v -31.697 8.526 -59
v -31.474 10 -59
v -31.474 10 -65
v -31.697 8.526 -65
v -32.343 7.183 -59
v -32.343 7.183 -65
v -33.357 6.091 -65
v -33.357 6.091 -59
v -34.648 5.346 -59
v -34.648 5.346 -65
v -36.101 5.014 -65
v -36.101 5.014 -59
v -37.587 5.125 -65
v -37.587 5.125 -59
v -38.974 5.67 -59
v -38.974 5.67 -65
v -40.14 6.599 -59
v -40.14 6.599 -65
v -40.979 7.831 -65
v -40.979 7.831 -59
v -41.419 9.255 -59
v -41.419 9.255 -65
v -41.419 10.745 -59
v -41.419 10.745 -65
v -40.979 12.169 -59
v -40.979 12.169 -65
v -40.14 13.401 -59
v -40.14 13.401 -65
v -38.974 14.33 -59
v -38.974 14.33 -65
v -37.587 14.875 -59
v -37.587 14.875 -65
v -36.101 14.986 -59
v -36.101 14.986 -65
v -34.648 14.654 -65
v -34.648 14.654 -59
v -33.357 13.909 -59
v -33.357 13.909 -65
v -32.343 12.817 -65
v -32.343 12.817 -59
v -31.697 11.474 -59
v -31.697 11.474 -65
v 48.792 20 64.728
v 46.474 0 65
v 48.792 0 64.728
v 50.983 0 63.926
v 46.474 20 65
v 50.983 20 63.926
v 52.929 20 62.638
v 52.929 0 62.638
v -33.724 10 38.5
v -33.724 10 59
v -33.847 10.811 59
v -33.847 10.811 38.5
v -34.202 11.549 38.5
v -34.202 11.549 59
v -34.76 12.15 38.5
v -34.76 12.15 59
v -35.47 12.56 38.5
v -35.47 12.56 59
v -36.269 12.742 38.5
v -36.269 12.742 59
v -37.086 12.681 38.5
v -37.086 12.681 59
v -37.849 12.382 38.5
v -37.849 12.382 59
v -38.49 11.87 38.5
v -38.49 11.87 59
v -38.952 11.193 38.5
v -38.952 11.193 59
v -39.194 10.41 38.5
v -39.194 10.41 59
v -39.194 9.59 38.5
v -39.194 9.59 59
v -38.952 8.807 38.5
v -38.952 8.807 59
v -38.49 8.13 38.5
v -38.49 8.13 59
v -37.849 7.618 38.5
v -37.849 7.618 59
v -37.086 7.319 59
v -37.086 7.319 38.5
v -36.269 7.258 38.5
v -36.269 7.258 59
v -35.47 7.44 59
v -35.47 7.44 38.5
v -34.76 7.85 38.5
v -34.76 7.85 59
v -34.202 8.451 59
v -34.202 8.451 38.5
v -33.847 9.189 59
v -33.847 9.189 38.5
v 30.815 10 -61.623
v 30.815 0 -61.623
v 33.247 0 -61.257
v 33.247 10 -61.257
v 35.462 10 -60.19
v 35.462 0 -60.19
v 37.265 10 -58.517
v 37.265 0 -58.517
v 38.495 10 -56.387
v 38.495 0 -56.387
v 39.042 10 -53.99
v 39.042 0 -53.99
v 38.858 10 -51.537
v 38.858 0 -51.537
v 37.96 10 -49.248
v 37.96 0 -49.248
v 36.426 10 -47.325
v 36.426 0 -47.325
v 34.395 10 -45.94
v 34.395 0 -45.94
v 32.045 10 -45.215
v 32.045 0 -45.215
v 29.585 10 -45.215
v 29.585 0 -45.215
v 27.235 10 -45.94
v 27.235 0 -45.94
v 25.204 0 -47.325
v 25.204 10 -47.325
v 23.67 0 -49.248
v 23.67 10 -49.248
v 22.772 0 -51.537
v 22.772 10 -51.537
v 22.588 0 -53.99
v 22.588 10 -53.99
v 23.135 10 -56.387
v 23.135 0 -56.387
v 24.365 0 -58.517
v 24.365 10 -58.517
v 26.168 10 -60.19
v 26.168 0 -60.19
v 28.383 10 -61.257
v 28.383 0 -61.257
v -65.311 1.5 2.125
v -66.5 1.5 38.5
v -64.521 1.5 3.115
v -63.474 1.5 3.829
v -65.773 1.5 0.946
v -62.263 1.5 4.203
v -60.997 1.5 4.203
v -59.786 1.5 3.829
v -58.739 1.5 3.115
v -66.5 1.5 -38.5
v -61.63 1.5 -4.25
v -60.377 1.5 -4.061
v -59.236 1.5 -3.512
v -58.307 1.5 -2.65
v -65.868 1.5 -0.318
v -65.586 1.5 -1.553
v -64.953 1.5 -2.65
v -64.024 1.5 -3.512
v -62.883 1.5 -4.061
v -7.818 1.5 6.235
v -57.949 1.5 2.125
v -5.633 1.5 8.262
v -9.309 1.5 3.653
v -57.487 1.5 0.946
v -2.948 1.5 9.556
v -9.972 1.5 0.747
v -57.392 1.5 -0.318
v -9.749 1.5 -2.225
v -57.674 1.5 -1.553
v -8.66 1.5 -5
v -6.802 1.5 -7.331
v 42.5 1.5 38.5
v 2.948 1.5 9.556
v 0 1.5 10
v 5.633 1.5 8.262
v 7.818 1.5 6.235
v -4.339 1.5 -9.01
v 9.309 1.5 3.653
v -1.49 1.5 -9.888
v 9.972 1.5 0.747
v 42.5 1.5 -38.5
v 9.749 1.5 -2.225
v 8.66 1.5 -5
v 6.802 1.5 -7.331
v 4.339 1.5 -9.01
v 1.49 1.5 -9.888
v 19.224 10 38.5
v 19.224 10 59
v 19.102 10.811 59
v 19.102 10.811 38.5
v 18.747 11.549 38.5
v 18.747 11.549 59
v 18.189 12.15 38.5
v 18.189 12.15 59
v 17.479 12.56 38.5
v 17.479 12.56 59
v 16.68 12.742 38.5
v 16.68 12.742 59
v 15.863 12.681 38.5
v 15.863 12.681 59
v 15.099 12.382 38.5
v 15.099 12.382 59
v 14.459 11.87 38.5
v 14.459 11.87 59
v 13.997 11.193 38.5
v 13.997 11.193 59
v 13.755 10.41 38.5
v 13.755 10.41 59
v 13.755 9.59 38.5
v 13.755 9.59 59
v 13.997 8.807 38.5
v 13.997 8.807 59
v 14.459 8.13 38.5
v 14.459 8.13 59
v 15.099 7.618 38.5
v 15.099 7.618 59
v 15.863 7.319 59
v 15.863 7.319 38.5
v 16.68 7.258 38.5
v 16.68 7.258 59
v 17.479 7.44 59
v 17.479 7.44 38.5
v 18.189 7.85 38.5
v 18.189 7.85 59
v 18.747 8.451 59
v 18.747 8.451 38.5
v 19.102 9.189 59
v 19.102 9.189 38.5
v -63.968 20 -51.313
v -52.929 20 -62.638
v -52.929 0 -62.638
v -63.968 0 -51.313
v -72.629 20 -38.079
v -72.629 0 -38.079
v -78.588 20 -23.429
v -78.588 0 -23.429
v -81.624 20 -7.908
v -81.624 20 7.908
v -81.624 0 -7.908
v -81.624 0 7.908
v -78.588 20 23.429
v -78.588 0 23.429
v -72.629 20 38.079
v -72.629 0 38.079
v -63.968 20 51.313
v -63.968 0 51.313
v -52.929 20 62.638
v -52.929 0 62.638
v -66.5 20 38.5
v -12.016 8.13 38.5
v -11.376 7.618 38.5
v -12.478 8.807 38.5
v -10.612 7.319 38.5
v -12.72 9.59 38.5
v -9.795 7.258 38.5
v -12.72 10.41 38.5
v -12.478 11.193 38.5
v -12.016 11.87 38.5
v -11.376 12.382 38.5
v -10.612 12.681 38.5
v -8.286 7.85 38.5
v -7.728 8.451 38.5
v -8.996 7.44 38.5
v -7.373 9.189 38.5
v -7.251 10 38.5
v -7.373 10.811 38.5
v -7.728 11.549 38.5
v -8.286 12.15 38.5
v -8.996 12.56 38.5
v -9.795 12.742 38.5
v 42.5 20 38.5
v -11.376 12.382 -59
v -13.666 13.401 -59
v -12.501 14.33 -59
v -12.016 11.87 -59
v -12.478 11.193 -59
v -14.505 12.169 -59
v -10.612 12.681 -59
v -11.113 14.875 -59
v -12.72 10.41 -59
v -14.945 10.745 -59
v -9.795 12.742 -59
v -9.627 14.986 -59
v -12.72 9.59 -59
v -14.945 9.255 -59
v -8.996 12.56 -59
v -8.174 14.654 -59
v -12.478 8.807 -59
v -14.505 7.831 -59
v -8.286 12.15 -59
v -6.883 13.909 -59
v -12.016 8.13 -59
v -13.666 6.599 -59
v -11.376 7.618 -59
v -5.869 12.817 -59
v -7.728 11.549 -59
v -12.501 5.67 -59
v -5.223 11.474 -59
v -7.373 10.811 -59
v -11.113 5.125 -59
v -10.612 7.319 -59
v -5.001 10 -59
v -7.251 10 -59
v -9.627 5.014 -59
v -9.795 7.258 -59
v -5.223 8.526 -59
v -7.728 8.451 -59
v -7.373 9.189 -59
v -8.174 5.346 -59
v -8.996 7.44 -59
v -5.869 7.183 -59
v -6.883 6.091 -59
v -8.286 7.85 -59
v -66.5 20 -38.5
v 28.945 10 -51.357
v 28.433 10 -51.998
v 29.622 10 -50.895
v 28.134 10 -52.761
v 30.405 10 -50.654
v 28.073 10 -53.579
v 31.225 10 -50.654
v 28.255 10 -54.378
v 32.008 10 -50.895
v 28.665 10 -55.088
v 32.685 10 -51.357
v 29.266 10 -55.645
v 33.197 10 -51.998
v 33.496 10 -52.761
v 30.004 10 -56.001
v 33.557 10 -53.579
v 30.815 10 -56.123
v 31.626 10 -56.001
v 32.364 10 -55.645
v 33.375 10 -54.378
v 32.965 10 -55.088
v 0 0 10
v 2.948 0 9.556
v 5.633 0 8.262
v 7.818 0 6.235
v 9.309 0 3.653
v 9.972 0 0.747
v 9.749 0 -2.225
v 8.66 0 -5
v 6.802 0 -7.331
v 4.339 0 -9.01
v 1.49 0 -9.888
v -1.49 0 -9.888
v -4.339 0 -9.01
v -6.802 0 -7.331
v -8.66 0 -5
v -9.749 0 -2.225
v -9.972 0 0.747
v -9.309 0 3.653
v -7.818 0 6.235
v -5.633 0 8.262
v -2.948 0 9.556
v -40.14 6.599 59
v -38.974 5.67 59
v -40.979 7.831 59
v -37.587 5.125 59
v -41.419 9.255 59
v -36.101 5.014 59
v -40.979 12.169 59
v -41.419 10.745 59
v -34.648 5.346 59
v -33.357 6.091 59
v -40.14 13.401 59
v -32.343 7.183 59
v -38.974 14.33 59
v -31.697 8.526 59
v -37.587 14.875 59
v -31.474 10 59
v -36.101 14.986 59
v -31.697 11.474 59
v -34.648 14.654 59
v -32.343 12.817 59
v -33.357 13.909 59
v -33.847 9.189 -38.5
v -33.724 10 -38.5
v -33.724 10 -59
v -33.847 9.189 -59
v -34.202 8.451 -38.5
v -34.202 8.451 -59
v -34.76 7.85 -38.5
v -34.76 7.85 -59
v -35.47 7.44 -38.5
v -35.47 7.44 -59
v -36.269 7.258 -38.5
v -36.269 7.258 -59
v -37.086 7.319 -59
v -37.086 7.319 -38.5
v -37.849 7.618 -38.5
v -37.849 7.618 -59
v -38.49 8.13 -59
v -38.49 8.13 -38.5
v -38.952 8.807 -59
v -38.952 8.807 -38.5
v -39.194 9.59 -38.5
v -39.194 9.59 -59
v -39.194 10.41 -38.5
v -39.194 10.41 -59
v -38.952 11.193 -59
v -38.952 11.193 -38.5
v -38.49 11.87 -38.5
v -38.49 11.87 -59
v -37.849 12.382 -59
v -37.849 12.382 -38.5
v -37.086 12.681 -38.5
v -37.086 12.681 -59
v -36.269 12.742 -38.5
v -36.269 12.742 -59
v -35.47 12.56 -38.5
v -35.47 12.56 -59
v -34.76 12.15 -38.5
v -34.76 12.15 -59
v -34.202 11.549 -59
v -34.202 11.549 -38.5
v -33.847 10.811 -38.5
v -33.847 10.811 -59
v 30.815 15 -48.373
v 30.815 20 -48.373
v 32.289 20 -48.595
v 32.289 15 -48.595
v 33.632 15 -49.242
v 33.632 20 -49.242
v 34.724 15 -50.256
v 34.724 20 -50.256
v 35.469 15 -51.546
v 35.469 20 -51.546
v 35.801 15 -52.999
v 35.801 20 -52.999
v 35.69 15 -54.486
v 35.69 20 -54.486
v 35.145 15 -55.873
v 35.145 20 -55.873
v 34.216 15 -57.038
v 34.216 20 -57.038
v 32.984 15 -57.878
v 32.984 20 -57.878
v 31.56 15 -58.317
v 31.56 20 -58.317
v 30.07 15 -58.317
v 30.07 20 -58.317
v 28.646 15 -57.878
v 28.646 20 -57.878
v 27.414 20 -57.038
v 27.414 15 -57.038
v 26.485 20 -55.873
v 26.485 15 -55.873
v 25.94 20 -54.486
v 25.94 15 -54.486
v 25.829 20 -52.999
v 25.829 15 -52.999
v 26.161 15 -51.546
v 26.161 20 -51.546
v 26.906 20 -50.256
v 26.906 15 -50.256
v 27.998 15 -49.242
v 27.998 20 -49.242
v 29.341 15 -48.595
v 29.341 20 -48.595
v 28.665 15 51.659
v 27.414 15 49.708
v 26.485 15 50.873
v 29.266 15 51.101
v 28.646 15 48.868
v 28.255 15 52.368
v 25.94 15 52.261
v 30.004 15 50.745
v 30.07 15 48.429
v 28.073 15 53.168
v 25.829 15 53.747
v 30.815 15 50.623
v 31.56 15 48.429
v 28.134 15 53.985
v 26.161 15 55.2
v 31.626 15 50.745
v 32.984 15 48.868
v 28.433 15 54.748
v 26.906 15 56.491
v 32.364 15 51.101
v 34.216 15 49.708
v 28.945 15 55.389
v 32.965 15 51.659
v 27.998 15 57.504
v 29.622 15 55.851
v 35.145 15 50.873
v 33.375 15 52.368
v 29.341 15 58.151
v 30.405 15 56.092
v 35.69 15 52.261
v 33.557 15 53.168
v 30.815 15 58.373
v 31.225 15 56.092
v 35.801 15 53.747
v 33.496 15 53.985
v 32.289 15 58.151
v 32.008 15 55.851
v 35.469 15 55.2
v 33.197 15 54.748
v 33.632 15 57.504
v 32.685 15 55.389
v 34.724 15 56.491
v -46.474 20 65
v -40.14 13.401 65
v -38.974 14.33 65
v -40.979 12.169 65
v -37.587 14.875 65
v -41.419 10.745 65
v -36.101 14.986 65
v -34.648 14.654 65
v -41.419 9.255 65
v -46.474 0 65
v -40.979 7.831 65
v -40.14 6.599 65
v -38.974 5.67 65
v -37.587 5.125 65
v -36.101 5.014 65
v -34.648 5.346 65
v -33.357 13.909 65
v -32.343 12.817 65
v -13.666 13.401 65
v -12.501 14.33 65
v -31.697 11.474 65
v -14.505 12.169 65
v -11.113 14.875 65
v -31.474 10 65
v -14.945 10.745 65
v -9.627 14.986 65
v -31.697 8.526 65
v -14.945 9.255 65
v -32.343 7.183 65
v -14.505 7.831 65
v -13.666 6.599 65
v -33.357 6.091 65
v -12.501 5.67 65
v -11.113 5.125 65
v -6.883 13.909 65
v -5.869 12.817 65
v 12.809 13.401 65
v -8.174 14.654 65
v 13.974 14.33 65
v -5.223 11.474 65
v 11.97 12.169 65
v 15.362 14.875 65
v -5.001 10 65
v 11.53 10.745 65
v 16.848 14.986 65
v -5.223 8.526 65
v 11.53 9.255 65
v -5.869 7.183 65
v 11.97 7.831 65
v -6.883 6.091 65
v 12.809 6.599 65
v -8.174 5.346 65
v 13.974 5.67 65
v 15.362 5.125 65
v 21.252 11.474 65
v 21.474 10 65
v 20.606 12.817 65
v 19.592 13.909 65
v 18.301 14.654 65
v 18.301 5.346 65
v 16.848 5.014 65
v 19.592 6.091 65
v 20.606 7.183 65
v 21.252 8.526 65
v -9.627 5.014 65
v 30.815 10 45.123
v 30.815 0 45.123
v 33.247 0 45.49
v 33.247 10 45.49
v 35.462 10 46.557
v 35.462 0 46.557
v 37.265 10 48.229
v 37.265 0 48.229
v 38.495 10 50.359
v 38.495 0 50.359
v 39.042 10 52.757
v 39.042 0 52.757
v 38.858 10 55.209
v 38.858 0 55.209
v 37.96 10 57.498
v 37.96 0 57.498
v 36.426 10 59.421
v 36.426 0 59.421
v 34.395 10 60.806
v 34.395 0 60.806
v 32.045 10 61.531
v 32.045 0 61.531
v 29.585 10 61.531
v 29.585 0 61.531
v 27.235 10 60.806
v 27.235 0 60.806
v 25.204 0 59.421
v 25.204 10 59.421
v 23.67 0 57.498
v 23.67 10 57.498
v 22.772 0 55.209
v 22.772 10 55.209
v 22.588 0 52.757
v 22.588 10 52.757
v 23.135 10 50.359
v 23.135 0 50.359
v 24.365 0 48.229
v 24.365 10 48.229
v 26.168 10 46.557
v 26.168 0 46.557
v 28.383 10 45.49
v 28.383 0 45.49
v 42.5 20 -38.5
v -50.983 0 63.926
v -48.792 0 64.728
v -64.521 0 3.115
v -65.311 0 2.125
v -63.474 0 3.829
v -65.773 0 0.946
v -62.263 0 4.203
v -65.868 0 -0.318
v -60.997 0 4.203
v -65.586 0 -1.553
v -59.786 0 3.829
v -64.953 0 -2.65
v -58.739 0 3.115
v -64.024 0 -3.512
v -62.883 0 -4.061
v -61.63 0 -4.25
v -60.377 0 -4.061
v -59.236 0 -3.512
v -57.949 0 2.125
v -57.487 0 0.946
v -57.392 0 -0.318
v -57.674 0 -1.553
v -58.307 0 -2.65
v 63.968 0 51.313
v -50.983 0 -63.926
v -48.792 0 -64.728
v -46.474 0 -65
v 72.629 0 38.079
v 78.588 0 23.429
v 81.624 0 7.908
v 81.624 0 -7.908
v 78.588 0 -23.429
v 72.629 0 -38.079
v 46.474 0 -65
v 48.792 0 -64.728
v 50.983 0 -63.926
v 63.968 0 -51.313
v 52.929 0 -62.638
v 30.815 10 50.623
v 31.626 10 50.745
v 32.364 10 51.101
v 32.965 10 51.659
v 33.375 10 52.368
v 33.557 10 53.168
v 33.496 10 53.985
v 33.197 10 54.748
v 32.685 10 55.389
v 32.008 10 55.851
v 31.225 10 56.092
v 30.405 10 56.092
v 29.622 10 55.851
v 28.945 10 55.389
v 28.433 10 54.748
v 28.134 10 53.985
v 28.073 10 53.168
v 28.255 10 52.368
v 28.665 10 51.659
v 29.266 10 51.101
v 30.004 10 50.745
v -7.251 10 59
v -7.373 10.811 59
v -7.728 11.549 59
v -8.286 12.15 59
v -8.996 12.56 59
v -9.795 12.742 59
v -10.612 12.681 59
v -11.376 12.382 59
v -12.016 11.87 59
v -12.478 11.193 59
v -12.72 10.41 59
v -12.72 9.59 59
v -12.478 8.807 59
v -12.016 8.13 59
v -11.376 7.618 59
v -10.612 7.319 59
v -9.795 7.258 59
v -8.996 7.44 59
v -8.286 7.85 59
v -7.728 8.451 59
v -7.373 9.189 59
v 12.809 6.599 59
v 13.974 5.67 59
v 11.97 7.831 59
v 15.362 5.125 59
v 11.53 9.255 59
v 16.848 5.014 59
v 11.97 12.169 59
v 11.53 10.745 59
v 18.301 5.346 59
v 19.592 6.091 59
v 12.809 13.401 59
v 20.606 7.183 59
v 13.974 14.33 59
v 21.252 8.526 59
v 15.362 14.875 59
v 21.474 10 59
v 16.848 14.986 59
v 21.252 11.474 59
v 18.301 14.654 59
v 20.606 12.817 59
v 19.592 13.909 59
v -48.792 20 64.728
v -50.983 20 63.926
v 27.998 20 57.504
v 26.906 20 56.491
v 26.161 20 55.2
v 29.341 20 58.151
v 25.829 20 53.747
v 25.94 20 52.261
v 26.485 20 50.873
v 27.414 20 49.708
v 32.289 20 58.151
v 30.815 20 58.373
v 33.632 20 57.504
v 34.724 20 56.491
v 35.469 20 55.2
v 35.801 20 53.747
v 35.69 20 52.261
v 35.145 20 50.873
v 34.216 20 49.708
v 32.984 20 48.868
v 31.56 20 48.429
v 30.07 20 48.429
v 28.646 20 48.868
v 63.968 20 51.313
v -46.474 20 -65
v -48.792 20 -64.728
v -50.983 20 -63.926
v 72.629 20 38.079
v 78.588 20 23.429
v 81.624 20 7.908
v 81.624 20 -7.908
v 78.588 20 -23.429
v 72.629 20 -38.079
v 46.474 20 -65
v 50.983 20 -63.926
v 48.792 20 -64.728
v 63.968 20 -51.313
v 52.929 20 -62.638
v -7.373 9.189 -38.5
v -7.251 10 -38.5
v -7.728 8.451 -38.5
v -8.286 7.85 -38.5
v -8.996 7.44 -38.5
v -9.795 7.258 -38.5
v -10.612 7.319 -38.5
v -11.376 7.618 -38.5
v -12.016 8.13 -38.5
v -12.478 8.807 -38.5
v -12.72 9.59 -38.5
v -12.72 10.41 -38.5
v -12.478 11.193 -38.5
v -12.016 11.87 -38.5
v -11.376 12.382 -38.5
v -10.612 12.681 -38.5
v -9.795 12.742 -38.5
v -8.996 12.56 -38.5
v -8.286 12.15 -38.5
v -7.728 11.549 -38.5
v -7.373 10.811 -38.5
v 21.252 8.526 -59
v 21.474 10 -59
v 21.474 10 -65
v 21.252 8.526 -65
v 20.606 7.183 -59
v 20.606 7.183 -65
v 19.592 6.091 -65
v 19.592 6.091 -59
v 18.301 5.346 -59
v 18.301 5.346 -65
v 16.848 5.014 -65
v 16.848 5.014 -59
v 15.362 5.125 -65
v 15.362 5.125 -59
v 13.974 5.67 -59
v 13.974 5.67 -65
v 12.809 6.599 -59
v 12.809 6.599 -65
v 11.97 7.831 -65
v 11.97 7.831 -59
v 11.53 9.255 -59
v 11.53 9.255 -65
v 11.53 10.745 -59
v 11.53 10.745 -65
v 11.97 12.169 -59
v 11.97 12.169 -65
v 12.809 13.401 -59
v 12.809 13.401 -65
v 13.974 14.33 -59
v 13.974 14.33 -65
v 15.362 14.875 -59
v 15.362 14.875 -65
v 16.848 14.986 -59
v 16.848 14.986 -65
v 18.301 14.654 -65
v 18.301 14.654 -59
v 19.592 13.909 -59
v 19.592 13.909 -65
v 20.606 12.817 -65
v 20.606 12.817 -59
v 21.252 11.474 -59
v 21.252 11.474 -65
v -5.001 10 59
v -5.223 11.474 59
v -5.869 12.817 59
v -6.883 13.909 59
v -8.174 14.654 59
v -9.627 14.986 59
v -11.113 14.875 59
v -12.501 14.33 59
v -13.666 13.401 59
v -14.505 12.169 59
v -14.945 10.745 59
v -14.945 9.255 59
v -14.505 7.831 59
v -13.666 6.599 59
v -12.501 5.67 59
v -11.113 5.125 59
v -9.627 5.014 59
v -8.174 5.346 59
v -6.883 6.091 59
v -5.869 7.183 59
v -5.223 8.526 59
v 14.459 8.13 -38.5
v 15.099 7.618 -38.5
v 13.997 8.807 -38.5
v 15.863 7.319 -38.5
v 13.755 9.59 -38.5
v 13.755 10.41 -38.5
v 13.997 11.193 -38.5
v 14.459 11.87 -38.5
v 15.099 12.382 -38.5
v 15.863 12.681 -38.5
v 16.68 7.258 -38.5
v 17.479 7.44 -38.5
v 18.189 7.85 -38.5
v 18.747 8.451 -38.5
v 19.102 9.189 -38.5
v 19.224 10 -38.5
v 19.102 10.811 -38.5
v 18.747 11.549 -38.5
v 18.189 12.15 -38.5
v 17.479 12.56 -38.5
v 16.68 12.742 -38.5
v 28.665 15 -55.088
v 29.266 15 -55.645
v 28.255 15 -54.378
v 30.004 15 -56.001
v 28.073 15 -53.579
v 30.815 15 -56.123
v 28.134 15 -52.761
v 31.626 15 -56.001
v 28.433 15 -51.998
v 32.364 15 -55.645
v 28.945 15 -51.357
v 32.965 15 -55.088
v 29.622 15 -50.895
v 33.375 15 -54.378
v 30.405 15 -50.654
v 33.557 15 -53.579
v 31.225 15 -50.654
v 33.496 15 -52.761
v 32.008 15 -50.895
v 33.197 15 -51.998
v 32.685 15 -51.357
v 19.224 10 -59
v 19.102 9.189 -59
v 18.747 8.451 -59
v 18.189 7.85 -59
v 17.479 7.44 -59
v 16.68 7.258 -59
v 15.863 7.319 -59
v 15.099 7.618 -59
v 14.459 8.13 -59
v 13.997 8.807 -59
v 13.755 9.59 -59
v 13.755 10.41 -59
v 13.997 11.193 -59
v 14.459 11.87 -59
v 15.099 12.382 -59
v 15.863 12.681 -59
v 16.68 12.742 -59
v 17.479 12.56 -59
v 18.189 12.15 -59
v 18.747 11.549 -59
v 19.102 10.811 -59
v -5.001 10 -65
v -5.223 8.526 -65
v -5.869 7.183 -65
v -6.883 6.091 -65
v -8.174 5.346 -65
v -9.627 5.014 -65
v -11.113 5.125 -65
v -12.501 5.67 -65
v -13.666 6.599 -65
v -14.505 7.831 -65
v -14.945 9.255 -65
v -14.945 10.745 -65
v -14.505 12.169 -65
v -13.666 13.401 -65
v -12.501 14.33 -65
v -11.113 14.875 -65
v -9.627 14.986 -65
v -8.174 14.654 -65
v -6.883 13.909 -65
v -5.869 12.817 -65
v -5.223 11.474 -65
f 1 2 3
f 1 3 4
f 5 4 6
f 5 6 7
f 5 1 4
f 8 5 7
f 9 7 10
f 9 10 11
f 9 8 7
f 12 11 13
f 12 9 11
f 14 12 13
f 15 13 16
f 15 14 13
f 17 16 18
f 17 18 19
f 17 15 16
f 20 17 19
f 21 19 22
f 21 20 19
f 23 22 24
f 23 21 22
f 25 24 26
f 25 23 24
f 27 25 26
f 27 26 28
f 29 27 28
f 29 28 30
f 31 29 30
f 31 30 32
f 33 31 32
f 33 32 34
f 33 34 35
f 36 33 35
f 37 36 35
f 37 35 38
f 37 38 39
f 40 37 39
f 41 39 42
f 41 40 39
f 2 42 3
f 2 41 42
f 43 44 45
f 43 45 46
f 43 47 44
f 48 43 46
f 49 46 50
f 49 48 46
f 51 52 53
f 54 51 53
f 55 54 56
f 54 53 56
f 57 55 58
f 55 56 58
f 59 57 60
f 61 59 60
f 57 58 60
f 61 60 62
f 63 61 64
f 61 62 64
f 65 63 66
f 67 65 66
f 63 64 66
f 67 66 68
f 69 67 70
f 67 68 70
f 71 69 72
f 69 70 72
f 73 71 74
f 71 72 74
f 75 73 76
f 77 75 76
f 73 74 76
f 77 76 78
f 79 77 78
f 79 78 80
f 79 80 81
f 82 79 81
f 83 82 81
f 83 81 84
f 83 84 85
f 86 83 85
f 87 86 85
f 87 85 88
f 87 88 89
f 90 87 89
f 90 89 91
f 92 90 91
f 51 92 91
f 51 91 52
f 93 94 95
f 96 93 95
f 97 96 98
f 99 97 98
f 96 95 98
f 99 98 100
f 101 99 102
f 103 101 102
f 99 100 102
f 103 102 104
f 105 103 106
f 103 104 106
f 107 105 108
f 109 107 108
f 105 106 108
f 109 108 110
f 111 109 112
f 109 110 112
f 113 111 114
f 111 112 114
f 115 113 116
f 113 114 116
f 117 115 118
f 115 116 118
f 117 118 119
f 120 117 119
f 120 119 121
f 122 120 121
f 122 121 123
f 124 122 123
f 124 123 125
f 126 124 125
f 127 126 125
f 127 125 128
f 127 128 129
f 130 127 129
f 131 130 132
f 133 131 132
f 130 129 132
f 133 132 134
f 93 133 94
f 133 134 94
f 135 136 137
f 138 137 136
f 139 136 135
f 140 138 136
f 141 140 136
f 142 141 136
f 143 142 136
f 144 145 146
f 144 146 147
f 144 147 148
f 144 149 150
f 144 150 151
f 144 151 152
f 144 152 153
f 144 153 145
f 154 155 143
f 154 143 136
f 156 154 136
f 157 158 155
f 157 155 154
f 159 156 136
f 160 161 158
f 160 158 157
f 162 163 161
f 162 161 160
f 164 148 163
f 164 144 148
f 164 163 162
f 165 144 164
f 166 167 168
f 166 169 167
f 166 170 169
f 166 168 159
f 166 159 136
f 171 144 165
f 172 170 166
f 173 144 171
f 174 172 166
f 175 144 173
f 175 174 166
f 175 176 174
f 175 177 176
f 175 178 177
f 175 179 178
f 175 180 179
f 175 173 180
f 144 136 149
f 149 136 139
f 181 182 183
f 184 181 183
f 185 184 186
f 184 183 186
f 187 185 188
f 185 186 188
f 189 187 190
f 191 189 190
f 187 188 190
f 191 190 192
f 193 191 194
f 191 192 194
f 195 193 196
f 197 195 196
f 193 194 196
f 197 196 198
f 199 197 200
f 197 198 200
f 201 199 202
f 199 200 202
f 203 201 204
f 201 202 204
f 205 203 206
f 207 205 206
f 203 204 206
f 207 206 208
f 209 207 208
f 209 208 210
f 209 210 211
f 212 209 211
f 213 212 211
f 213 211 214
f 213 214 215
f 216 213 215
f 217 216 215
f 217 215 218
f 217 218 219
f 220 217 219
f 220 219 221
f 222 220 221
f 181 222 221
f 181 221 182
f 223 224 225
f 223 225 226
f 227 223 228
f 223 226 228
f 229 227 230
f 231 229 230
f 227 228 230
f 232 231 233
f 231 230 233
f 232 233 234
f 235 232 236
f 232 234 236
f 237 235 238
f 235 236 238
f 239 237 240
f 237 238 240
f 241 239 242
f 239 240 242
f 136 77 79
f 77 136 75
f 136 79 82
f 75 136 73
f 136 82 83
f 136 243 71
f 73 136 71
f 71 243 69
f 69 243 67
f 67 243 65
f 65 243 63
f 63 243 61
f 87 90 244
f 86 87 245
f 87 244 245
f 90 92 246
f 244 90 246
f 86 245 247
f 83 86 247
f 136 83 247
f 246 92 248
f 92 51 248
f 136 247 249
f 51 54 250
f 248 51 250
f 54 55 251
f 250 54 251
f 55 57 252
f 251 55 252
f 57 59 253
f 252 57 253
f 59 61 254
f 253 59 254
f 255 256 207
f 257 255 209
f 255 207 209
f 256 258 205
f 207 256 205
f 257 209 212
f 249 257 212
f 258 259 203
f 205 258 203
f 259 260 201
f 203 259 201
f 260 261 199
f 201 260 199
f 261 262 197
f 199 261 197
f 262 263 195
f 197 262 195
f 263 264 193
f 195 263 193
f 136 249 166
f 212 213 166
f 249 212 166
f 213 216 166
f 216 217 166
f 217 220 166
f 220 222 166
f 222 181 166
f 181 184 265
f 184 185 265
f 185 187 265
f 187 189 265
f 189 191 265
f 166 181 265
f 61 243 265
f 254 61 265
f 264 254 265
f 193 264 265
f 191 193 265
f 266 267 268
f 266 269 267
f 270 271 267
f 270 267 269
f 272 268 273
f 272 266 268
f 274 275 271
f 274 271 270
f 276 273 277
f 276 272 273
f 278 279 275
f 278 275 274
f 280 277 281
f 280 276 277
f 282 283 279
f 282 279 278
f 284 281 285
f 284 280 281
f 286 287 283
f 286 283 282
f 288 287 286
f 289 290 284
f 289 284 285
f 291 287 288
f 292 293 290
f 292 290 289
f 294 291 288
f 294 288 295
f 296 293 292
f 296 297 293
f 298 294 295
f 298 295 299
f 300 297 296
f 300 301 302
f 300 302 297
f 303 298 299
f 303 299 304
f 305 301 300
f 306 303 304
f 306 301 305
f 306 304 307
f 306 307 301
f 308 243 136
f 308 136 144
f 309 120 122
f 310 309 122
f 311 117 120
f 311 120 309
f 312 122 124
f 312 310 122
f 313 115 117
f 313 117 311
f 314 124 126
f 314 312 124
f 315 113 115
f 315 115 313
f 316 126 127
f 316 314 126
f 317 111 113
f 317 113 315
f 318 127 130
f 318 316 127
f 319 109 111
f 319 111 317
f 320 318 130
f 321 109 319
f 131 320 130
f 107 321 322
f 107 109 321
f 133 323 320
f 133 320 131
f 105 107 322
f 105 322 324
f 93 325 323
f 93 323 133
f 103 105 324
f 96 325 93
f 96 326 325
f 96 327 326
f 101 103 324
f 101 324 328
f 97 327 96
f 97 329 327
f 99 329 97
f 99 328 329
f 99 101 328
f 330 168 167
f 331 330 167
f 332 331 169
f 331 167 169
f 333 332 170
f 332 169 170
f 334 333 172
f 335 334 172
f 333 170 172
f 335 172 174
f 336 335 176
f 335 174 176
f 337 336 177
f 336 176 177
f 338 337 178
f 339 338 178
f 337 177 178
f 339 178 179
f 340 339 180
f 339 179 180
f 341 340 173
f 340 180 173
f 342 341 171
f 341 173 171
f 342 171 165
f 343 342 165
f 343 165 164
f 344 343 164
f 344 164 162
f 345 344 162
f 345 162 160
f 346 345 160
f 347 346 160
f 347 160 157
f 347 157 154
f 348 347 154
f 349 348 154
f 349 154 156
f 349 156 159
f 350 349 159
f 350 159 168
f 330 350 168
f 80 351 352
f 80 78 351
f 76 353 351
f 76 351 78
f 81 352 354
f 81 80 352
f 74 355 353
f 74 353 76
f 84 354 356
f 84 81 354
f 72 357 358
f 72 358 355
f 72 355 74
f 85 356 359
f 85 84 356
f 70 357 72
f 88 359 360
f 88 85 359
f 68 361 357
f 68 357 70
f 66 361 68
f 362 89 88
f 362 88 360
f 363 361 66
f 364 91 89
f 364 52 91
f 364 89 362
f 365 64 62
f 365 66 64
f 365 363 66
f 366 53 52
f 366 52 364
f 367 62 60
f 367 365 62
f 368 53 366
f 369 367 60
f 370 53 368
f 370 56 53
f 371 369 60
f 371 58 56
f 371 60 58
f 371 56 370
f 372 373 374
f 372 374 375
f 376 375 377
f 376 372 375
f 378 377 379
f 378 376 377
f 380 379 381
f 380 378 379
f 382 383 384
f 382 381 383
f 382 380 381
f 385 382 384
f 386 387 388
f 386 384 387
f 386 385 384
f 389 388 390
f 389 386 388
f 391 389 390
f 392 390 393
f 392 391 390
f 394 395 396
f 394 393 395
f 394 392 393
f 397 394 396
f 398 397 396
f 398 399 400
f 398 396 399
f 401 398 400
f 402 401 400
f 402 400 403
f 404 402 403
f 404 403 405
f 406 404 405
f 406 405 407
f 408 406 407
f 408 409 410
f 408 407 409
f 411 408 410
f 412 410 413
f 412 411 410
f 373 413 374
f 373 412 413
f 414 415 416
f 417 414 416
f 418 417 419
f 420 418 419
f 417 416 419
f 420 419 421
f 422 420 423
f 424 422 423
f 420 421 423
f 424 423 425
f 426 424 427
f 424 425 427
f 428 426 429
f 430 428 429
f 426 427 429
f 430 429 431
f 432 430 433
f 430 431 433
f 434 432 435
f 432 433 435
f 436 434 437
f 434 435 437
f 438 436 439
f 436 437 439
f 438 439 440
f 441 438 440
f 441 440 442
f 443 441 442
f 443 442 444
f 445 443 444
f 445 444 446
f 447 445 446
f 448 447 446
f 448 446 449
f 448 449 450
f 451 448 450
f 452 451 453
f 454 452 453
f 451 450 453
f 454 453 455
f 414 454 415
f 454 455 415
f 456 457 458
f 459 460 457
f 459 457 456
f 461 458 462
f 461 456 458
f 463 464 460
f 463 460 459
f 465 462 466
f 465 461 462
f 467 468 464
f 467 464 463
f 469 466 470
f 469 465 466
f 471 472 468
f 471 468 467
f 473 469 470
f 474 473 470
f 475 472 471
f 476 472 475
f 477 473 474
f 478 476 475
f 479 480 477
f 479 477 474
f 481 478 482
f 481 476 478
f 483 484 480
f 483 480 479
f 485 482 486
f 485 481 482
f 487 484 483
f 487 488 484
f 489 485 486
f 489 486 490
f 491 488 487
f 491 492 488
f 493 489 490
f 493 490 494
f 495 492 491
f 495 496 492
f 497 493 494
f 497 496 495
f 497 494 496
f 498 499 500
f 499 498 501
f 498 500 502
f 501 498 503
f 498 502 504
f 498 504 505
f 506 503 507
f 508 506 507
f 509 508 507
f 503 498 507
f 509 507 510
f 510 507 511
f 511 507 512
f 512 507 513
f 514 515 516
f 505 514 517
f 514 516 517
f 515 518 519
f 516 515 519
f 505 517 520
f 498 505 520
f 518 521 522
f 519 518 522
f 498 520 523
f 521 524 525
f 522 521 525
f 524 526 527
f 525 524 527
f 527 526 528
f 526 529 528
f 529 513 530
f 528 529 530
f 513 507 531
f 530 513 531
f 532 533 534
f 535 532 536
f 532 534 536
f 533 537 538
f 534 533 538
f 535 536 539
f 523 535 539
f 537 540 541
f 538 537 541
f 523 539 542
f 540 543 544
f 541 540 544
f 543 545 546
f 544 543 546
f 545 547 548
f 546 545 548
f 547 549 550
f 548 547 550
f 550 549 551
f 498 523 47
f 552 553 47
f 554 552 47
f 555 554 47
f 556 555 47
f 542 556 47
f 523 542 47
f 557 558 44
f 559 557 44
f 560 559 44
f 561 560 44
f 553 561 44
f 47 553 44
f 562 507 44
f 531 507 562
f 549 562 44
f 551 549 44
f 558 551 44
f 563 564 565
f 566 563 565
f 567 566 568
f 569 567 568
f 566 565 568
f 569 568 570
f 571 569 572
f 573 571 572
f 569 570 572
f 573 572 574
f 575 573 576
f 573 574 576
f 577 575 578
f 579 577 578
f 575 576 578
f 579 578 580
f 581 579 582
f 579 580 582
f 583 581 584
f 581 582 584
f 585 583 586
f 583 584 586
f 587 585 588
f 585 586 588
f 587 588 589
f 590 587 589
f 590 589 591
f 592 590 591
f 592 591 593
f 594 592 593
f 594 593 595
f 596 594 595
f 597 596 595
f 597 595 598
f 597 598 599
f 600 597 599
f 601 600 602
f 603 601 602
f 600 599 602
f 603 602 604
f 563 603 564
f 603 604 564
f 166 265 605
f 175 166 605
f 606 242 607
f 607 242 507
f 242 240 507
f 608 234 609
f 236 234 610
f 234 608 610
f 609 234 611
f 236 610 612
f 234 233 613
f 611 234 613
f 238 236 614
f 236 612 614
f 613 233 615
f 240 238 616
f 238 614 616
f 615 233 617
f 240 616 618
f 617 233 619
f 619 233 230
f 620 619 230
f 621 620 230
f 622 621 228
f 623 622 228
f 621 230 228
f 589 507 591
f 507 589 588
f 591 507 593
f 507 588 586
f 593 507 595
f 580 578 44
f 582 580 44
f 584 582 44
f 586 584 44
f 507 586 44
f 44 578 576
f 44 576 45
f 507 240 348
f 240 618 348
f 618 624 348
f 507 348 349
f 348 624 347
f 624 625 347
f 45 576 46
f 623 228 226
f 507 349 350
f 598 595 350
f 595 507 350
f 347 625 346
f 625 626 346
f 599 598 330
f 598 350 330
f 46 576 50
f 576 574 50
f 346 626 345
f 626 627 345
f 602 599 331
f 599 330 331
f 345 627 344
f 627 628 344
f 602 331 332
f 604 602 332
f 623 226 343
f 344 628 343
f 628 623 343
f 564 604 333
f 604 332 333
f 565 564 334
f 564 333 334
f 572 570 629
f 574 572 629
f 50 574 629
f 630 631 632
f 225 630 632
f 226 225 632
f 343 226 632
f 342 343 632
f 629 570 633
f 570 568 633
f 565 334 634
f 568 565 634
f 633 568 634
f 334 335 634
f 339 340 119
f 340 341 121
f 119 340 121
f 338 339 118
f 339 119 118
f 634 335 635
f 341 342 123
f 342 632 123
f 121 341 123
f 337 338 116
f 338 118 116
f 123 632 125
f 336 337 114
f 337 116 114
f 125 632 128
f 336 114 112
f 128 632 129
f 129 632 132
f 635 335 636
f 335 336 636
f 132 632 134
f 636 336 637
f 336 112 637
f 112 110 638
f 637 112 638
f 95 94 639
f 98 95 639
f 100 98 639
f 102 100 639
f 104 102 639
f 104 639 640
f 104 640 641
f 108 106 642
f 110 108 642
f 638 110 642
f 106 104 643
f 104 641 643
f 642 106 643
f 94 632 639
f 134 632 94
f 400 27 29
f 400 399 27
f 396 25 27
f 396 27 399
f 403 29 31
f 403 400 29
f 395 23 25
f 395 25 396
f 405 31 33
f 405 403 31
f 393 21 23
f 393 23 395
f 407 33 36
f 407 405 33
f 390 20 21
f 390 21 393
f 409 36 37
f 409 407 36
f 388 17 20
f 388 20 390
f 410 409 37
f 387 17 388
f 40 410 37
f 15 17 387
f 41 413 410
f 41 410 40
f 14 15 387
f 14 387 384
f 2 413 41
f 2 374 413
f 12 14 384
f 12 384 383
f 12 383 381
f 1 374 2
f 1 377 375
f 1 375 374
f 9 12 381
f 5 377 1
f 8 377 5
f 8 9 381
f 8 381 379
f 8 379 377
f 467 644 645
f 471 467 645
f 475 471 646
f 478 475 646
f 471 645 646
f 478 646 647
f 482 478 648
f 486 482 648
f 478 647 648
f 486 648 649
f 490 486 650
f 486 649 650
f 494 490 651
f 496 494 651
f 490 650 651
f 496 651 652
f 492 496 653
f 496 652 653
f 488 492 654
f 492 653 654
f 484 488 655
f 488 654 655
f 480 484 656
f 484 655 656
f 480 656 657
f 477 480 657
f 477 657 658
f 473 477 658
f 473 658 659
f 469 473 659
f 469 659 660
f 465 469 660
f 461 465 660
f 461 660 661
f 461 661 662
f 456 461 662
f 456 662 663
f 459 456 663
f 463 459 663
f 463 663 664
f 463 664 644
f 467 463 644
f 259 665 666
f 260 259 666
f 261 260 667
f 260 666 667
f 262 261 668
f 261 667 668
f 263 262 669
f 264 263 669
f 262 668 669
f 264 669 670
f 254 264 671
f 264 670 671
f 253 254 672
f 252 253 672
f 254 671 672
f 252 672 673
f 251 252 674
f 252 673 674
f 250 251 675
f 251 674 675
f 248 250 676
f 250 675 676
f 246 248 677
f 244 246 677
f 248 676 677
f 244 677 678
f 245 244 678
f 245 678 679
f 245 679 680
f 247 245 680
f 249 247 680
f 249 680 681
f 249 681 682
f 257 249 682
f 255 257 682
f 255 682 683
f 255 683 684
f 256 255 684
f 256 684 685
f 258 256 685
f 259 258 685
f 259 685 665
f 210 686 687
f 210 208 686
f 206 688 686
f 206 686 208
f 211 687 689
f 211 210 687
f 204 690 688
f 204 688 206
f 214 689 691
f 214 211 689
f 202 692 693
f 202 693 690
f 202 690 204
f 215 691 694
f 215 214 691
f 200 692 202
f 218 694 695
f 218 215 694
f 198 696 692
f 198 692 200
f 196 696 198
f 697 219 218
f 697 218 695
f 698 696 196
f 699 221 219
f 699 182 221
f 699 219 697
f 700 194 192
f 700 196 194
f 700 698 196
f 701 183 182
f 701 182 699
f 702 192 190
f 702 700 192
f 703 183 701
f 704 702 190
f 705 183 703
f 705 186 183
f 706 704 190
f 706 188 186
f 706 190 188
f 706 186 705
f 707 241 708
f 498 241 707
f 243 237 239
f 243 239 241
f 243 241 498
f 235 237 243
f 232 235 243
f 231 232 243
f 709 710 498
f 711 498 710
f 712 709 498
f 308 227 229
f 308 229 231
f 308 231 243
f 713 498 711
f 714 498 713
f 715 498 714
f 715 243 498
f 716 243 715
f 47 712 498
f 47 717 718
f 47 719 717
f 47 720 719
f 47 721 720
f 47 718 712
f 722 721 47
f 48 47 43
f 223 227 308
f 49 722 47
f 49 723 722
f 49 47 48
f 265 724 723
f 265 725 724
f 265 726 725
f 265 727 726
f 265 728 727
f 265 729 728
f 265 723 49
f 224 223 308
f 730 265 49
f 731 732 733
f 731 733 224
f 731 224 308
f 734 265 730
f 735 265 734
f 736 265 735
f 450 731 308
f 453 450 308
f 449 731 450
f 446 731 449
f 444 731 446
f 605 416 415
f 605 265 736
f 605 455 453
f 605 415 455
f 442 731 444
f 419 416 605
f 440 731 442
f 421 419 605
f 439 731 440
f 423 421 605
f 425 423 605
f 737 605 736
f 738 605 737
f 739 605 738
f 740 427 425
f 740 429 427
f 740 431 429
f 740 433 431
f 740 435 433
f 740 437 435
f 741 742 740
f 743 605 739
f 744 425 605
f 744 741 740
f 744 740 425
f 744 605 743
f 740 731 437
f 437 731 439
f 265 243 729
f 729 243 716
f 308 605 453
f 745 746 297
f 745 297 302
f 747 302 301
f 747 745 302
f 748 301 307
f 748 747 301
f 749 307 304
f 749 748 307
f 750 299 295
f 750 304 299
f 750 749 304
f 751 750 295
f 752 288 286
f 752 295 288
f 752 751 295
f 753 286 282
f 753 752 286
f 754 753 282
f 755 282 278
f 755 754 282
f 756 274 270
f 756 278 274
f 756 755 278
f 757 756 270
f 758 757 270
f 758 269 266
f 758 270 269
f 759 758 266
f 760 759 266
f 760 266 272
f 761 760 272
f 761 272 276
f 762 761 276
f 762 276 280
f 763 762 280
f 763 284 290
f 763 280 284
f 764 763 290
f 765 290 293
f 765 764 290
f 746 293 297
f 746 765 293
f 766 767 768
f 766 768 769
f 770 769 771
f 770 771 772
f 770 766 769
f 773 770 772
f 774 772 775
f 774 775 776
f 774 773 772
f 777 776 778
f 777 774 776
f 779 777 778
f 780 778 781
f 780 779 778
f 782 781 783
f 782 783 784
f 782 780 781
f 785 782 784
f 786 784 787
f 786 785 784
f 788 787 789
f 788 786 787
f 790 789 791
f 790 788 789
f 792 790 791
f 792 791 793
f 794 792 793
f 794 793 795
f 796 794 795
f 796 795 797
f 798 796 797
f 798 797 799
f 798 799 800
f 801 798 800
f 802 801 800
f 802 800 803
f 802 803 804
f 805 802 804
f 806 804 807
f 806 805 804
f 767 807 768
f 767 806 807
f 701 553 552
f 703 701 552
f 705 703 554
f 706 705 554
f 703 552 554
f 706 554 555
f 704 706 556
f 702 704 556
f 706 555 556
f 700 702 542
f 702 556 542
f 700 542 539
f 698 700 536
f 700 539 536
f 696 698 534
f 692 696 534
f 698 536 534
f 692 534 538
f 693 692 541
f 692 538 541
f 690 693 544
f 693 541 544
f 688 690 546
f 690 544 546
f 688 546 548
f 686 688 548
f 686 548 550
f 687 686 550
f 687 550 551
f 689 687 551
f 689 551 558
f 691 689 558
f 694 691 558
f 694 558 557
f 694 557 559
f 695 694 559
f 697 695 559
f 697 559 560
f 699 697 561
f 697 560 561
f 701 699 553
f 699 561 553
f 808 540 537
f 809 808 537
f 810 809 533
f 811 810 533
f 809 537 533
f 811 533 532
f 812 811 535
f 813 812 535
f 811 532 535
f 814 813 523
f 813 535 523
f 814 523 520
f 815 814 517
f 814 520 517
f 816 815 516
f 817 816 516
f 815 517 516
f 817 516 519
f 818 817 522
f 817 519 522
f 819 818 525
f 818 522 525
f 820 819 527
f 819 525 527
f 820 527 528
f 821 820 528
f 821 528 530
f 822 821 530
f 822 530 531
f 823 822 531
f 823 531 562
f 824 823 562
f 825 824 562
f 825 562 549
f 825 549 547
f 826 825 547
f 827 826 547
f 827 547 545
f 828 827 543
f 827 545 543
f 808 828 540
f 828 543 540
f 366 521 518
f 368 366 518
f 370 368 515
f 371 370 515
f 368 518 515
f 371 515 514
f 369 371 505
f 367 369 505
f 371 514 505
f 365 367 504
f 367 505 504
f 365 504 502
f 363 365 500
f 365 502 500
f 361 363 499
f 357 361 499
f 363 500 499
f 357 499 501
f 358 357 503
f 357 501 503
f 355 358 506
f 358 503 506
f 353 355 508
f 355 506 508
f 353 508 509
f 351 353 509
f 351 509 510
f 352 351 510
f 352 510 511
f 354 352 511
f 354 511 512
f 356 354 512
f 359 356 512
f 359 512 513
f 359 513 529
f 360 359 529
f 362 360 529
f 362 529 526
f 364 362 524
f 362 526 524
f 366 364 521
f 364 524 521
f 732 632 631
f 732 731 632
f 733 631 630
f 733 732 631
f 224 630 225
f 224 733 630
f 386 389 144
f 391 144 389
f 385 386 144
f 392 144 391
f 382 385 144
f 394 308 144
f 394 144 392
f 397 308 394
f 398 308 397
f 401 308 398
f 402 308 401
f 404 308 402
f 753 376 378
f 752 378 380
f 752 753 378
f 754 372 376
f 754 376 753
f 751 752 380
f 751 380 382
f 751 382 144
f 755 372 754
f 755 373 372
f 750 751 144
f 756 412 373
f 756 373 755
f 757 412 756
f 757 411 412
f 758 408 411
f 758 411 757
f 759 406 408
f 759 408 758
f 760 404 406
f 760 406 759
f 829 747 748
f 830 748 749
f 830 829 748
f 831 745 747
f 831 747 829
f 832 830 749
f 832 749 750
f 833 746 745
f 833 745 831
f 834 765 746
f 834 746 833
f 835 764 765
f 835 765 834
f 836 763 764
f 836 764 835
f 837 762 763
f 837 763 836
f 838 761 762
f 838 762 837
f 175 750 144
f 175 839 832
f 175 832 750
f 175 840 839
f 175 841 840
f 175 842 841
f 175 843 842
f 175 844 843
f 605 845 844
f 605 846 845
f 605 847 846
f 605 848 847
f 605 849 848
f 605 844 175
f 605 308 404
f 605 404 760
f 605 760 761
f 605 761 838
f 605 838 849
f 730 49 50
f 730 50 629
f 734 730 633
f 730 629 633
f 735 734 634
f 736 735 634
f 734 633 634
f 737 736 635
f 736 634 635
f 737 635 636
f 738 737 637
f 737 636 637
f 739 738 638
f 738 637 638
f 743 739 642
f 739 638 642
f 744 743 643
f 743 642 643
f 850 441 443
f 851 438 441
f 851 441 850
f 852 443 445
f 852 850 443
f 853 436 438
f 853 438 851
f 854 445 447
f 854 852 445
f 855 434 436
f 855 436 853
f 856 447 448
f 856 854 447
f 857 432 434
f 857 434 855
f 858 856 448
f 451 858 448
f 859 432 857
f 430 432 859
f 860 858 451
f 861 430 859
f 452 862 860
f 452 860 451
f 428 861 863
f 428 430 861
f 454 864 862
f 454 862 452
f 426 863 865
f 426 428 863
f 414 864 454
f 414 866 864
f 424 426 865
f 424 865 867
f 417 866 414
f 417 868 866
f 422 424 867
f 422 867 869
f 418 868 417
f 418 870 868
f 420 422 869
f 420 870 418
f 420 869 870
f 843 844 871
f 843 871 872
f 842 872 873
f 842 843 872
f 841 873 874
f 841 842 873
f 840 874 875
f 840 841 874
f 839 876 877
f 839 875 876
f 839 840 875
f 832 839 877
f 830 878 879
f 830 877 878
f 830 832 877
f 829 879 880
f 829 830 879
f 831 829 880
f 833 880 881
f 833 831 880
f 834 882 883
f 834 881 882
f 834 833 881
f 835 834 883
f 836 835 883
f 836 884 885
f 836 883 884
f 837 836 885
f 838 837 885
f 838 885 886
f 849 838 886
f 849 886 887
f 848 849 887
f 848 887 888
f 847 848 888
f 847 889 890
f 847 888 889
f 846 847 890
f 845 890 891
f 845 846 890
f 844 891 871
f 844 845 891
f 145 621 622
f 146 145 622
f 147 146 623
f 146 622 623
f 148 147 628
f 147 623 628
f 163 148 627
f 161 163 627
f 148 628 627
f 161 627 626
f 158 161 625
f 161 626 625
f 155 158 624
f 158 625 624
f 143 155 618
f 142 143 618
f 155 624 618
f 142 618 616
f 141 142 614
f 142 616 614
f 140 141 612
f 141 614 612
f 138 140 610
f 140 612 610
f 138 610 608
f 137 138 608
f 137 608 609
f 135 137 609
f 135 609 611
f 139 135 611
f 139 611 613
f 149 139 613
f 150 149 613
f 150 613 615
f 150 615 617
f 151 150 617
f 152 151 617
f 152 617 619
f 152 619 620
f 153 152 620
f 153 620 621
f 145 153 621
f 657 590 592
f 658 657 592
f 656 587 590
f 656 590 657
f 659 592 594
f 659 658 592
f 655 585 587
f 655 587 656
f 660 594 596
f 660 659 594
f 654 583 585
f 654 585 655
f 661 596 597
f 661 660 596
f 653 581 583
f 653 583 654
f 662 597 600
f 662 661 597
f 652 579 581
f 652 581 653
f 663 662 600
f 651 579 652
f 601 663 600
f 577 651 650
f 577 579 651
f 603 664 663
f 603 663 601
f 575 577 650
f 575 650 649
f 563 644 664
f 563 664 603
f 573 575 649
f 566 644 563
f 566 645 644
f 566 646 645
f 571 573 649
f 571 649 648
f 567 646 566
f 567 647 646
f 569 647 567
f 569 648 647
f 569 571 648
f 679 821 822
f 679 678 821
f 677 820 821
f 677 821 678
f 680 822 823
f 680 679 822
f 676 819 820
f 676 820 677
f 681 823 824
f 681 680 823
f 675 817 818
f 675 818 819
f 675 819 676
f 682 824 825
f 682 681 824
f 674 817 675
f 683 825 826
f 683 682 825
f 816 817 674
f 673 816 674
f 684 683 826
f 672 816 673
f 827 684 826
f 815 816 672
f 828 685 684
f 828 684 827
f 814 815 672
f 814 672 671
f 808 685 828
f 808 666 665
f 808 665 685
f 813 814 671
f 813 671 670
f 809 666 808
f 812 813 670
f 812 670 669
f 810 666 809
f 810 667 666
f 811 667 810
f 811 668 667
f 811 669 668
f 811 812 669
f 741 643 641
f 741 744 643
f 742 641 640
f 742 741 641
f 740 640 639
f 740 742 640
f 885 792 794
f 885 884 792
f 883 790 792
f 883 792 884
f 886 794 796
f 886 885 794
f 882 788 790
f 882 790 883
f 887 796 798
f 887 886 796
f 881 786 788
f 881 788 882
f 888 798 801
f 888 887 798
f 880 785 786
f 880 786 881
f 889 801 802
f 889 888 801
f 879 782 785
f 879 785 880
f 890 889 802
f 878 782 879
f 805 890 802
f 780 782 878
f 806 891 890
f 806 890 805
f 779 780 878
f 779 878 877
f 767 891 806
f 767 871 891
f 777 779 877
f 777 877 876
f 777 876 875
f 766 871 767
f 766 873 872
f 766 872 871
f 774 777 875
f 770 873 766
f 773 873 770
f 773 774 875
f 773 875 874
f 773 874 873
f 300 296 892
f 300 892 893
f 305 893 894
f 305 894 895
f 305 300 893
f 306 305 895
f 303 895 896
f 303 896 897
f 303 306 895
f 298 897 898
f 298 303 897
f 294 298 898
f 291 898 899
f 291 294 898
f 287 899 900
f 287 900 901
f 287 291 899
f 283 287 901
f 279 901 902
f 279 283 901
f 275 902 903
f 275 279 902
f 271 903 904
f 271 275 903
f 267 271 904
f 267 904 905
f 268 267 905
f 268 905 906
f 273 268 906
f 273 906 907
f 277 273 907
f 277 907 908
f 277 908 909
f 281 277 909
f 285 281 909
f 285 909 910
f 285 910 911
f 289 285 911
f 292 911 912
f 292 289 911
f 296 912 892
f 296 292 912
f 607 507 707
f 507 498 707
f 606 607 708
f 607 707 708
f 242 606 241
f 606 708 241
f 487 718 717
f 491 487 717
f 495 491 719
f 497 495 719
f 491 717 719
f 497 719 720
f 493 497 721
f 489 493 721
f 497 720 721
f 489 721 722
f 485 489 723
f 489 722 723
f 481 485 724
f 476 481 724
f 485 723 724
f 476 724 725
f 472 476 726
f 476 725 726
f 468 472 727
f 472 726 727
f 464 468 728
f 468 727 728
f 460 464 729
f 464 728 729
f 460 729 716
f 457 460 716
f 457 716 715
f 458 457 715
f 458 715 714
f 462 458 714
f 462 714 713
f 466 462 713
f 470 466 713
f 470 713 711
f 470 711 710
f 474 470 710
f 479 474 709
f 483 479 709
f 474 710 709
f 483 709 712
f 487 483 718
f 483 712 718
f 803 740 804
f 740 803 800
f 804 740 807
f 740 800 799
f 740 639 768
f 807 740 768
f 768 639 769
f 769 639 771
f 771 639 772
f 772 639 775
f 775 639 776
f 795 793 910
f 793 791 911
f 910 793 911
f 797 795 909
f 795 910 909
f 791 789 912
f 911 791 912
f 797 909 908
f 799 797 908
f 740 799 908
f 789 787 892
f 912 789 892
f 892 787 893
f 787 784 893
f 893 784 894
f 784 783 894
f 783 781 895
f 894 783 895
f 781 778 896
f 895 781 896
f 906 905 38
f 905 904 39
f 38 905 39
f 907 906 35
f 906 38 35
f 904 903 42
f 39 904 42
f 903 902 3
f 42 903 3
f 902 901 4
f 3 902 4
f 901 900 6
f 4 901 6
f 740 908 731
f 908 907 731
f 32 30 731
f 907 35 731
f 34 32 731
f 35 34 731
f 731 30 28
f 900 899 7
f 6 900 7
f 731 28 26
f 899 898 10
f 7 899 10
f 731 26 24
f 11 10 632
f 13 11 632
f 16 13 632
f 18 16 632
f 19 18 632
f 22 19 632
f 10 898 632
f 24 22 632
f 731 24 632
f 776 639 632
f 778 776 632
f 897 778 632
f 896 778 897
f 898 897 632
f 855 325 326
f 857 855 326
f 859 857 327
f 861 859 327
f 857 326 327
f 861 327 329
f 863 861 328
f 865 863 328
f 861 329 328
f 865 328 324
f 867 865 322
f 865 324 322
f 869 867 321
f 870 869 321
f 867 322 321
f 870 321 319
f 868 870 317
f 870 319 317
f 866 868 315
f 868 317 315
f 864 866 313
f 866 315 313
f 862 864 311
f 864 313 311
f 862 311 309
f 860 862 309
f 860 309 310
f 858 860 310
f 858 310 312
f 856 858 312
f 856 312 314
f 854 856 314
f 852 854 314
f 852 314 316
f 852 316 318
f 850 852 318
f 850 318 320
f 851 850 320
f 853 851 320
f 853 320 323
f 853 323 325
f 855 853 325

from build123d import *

# Parameters (mm, degrees)
BOSS_EXTRUDE1_DEPTH = 20
FILLET1_R           = 10
SKETCH2_W           = 109
SKETCH2_H           = 77
CUT_EXTRUDE1_DEPTH  = 18.5
SKETCH4_R           = 8.25
SKETCH4_R_2         = 4.25
CUT_EXTRUDE2_DEPTH  = 10
SKETCH5_R           = 10
CUT_EXTRUDE3_DEPTH  = 10
SKETCH6_R           = 2.75
CUT_EXTRUDE4_DEPTH  = 30
CUT_EXTRUDE5_START  = -30
SKETCH7_R           = 2.75
CUT_EXTRUDE5_DEPTH  = 30
SKETCH8_R           = 5
CUT_EXTRUDE6_DEPTH  = 6
CUT_EXTRUDE7_START  = -6
SKETCH9_R           = 5
CUT_EXTRUDE7_DEPTH  = 6
SKETCH10_R          = 2.75
CUT_EXTRUDE8_DEPTH  = 20
SKETCH11_R          = 5
CUT_EXTRUDE9_DEPTH  = 5


with BuildPart() as part:
    # Sketch1 → Boss-Extrude1 (new body)
    with BuildSketch(Plane(origin=(0, 0, 0), x_dir=(1, 0, 0), z_dir=(0, 1, 0))):
        with BuildLine():
            Line((-50, -65), (50, -65))
            ThreePointArc((50, -65), (82.006097334, 0), (50, 65))
            Line((50, 65), (-50, 65))
            ThreePointArc((-50, 65), (-82.006097334, 0), (-50, -65))
        make_face()
    extrude(amount=BOSS_EXTRUDE1_DEPTH)

    # Fillet1
    fillet1_edges = [part.edges().sort_by_distance(p)[0] for p in [
        (-50, 10, -65),
        (50, 10, -65),
        (50, 10, 65),
        (-50, 10, 65),
    ]]
    fillet(fillet1_edges, radius=FILLET1_R)

    # Sketch2 → Cut-Extrude1 (cut)
    with BuildSketch(Plane(origin=(0, 20, 0), x_dir=(1, 0, 0), z_dir=(0, 1, 0))):
        with Locations((-12, 0)):
            Rectangle(SKETCH2_W, SKETCH2_H)
    extrude(amount=-CUT_EXTRUDE1_DEPTH, mode=Mode.SUBTRACT)

    # Sketch4 → Cut-Extrude2 (cut)
    with BuildSketch(Plane.XZ):
        with Locations((30.815, 53.373145635)):
            Circle(SKETCH4_R)
        with Locations((30.815, -53.373145635)):
            Circle(SKETCH4_R)
        with Locations((-61.63, 0)):
            Circle(SKETCH4_R_2)
    extrude(amount=-CUT_EXTRUDE2_DEPTH, mode=Mode.SUBTRACT)

    # Sketch5 → Cut-Extrude3 (cut)
    with BuildSketch(Plane(origin=(0, 1.5, 0), x_dir=(1, 0, 0), z_dir=(0, 1, 0))):
        Circle(SKETCH5_R)
    extrude(amount=-CUT_EXTRUDE3_DEPTH, mode=Mode.SUBTRACT)

    # Sketch6 → Cut-Extrude4 (cut)
    with BuildSketch(Plane.XY.offset(65)):
        with Locations((-36.474488199, 10)):
            Circle(SKETCH6_R)
        with Locations((-10.000511801, 10)):
            Circle(SKETCH6_R)
        with Locations((16.474488199, 10)):
            Circle(SKETCH6_R)
    extrude(amount=-CUT_EXTRUDE4_DEPTH, mode=Mode.SUBTRACT)

    # Sketch7 → Cut-Extrude5 (cut)
    with BuildSketch(Plane(origin=(0, 0, -65), x_dir=(-1, 0, 0), z_dir=(0, 0, -1)).offset(CUT_EXTRUDE5_START)):
        with Locations((-16.474488199, 10)):
            Circle(SKETCH7_R)
        with Locations((10.000511801, 10)):
            Circle(SKETCH7_R)
        with Locations((36.474488199, 10)):
            Circle(SKETCH7_R)
    extrude(amount=CUT_EXTRUDE5_DEPTH, mode=Mode.SUBTRACT)

    # Sketch8 → Cut-Extrude6 (cut)
    with BuildSketch(Plane.XY.offset(65)):
        with Locations((-36.474488199, 10)):
            Circle(SKETCH8_R)
        with Locations((-10.000511801, 10)):
            Circle(SKETCH8_R)
        with Locations((16.474488199, 10)):
            Circle(SKETCH8_R)
    extrude(amount=-CUT_EXTRUDE6_DEPTH, mode=Mode.SUBTRACT)

    # Sketch9 → Cut-Extrude7 (cut)
    with BuildSketch(Plane(origin=(0, 0, -65), x_dir=(-1, 0, 0), z_dir=(0, 0, -1)).offset(CUT_EXTRUDE7_START)):
        with Locations((-16.474488199, 10)):
            Circle(SKETCH9_R)
        with Locations((10.000511801, 10)):
            Circle(SKETCH9_R)
        with Locations((36.474488199, 10)):
            Circle(SKETCH9_R)
    extrude(amount=CUT_EXTRUDE7_DEPTH, mode=Mode.SUBTRACT)

    # Sketch10 → Cut-Extrude8 (cut)
    with BuildSketch(Plane.XZ.offset(-10)):
        with Locations((30.815, 53.373145635)):
            Circle(SKETCH10_R)
        with Locations((30.815, -53.373145635)):
            Circle(SKETCH10_R)
    extrude(amount=-CUT_EXTRUDE8_DEPTH, mode=Mode.SUBTRACT)

    # Sketch11 → Cut-Extrude9 (cut)
    with BuildSketch(Plane(origin=(0, 20, 0), x_dir=(1, 0, 0), z_dir=(0, 1, 0))):
        with Locations((30.815, 53.373145635)):
            Circle(SKETCH11_R)
        with Locations((30.815, -53.373145635)):
            Circle(SKETCH11_R)
    extrude(amount=-CUT_EXTRUDE9_DEPTH, mode=Mode.SUBTRACT)


solid = part.part
